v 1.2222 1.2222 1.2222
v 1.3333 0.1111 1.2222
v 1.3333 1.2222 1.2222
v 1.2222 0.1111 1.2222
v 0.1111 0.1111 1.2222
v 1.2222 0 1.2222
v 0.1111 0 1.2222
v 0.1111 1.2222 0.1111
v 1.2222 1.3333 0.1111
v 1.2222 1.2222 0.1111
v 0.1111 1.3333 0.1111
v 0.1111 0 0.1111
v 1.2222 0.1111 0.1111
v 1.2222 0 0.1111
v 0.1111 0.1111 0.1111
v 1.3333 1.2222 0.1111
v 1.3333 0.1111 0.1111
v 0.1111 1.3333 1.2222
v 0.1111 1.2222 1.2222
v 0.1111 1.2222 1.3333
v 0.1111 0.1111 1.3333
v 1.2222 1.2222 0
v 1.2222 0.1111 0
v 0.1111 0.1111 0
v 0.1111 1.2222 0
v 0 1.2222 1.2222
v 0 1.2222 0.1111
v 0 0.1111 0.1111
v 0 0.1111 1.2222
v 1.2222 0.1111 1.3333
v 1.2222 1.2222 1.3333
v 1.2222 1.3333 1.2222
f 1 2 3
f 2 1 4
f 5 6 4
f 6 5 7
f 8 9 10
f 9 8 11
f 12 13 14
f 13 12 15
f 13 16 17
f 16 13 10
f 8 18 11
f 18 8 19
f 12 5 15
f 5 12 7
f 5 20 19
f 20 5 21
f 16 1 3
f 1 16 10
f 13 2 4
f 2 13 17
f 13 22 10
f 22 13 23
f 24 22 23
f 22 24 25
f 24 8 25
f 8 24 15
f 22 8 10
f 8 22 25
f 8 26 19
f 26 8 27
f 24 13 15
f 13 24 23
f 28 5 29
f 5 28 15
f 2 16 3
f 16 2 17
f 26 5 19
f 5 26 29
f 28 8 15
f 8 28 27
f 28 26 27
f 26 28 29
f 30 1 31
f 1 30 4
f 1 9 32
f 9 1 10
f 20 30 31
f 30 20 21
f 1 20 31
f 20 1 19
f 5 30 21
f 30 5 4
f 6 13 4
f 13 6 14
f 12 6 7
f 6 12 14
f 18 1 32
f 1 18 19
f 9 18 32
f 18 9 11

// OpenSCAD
difference() {
	scale([0.333333333333/3, 0.333333333333/3, 0.333333333333/3]) {
		translate([1, 1, 1]) {
			cube(size=10);
		}
		translate([1, 1, 0]) {
			cube(size=10);
		}
		translate([2, 1, 1]) {
			cube(size=10);
		}
		translate([0, 1, 1]) {
			cube(size=10);
		}
		translate([1, 1, 2]) {
			cube(size=10);
		}
		translate([1, 0, 1]) {
			cube(size=10);
		}
		translate([1, 2, 1]) {
			cube(size=10);
		}
	}
}
